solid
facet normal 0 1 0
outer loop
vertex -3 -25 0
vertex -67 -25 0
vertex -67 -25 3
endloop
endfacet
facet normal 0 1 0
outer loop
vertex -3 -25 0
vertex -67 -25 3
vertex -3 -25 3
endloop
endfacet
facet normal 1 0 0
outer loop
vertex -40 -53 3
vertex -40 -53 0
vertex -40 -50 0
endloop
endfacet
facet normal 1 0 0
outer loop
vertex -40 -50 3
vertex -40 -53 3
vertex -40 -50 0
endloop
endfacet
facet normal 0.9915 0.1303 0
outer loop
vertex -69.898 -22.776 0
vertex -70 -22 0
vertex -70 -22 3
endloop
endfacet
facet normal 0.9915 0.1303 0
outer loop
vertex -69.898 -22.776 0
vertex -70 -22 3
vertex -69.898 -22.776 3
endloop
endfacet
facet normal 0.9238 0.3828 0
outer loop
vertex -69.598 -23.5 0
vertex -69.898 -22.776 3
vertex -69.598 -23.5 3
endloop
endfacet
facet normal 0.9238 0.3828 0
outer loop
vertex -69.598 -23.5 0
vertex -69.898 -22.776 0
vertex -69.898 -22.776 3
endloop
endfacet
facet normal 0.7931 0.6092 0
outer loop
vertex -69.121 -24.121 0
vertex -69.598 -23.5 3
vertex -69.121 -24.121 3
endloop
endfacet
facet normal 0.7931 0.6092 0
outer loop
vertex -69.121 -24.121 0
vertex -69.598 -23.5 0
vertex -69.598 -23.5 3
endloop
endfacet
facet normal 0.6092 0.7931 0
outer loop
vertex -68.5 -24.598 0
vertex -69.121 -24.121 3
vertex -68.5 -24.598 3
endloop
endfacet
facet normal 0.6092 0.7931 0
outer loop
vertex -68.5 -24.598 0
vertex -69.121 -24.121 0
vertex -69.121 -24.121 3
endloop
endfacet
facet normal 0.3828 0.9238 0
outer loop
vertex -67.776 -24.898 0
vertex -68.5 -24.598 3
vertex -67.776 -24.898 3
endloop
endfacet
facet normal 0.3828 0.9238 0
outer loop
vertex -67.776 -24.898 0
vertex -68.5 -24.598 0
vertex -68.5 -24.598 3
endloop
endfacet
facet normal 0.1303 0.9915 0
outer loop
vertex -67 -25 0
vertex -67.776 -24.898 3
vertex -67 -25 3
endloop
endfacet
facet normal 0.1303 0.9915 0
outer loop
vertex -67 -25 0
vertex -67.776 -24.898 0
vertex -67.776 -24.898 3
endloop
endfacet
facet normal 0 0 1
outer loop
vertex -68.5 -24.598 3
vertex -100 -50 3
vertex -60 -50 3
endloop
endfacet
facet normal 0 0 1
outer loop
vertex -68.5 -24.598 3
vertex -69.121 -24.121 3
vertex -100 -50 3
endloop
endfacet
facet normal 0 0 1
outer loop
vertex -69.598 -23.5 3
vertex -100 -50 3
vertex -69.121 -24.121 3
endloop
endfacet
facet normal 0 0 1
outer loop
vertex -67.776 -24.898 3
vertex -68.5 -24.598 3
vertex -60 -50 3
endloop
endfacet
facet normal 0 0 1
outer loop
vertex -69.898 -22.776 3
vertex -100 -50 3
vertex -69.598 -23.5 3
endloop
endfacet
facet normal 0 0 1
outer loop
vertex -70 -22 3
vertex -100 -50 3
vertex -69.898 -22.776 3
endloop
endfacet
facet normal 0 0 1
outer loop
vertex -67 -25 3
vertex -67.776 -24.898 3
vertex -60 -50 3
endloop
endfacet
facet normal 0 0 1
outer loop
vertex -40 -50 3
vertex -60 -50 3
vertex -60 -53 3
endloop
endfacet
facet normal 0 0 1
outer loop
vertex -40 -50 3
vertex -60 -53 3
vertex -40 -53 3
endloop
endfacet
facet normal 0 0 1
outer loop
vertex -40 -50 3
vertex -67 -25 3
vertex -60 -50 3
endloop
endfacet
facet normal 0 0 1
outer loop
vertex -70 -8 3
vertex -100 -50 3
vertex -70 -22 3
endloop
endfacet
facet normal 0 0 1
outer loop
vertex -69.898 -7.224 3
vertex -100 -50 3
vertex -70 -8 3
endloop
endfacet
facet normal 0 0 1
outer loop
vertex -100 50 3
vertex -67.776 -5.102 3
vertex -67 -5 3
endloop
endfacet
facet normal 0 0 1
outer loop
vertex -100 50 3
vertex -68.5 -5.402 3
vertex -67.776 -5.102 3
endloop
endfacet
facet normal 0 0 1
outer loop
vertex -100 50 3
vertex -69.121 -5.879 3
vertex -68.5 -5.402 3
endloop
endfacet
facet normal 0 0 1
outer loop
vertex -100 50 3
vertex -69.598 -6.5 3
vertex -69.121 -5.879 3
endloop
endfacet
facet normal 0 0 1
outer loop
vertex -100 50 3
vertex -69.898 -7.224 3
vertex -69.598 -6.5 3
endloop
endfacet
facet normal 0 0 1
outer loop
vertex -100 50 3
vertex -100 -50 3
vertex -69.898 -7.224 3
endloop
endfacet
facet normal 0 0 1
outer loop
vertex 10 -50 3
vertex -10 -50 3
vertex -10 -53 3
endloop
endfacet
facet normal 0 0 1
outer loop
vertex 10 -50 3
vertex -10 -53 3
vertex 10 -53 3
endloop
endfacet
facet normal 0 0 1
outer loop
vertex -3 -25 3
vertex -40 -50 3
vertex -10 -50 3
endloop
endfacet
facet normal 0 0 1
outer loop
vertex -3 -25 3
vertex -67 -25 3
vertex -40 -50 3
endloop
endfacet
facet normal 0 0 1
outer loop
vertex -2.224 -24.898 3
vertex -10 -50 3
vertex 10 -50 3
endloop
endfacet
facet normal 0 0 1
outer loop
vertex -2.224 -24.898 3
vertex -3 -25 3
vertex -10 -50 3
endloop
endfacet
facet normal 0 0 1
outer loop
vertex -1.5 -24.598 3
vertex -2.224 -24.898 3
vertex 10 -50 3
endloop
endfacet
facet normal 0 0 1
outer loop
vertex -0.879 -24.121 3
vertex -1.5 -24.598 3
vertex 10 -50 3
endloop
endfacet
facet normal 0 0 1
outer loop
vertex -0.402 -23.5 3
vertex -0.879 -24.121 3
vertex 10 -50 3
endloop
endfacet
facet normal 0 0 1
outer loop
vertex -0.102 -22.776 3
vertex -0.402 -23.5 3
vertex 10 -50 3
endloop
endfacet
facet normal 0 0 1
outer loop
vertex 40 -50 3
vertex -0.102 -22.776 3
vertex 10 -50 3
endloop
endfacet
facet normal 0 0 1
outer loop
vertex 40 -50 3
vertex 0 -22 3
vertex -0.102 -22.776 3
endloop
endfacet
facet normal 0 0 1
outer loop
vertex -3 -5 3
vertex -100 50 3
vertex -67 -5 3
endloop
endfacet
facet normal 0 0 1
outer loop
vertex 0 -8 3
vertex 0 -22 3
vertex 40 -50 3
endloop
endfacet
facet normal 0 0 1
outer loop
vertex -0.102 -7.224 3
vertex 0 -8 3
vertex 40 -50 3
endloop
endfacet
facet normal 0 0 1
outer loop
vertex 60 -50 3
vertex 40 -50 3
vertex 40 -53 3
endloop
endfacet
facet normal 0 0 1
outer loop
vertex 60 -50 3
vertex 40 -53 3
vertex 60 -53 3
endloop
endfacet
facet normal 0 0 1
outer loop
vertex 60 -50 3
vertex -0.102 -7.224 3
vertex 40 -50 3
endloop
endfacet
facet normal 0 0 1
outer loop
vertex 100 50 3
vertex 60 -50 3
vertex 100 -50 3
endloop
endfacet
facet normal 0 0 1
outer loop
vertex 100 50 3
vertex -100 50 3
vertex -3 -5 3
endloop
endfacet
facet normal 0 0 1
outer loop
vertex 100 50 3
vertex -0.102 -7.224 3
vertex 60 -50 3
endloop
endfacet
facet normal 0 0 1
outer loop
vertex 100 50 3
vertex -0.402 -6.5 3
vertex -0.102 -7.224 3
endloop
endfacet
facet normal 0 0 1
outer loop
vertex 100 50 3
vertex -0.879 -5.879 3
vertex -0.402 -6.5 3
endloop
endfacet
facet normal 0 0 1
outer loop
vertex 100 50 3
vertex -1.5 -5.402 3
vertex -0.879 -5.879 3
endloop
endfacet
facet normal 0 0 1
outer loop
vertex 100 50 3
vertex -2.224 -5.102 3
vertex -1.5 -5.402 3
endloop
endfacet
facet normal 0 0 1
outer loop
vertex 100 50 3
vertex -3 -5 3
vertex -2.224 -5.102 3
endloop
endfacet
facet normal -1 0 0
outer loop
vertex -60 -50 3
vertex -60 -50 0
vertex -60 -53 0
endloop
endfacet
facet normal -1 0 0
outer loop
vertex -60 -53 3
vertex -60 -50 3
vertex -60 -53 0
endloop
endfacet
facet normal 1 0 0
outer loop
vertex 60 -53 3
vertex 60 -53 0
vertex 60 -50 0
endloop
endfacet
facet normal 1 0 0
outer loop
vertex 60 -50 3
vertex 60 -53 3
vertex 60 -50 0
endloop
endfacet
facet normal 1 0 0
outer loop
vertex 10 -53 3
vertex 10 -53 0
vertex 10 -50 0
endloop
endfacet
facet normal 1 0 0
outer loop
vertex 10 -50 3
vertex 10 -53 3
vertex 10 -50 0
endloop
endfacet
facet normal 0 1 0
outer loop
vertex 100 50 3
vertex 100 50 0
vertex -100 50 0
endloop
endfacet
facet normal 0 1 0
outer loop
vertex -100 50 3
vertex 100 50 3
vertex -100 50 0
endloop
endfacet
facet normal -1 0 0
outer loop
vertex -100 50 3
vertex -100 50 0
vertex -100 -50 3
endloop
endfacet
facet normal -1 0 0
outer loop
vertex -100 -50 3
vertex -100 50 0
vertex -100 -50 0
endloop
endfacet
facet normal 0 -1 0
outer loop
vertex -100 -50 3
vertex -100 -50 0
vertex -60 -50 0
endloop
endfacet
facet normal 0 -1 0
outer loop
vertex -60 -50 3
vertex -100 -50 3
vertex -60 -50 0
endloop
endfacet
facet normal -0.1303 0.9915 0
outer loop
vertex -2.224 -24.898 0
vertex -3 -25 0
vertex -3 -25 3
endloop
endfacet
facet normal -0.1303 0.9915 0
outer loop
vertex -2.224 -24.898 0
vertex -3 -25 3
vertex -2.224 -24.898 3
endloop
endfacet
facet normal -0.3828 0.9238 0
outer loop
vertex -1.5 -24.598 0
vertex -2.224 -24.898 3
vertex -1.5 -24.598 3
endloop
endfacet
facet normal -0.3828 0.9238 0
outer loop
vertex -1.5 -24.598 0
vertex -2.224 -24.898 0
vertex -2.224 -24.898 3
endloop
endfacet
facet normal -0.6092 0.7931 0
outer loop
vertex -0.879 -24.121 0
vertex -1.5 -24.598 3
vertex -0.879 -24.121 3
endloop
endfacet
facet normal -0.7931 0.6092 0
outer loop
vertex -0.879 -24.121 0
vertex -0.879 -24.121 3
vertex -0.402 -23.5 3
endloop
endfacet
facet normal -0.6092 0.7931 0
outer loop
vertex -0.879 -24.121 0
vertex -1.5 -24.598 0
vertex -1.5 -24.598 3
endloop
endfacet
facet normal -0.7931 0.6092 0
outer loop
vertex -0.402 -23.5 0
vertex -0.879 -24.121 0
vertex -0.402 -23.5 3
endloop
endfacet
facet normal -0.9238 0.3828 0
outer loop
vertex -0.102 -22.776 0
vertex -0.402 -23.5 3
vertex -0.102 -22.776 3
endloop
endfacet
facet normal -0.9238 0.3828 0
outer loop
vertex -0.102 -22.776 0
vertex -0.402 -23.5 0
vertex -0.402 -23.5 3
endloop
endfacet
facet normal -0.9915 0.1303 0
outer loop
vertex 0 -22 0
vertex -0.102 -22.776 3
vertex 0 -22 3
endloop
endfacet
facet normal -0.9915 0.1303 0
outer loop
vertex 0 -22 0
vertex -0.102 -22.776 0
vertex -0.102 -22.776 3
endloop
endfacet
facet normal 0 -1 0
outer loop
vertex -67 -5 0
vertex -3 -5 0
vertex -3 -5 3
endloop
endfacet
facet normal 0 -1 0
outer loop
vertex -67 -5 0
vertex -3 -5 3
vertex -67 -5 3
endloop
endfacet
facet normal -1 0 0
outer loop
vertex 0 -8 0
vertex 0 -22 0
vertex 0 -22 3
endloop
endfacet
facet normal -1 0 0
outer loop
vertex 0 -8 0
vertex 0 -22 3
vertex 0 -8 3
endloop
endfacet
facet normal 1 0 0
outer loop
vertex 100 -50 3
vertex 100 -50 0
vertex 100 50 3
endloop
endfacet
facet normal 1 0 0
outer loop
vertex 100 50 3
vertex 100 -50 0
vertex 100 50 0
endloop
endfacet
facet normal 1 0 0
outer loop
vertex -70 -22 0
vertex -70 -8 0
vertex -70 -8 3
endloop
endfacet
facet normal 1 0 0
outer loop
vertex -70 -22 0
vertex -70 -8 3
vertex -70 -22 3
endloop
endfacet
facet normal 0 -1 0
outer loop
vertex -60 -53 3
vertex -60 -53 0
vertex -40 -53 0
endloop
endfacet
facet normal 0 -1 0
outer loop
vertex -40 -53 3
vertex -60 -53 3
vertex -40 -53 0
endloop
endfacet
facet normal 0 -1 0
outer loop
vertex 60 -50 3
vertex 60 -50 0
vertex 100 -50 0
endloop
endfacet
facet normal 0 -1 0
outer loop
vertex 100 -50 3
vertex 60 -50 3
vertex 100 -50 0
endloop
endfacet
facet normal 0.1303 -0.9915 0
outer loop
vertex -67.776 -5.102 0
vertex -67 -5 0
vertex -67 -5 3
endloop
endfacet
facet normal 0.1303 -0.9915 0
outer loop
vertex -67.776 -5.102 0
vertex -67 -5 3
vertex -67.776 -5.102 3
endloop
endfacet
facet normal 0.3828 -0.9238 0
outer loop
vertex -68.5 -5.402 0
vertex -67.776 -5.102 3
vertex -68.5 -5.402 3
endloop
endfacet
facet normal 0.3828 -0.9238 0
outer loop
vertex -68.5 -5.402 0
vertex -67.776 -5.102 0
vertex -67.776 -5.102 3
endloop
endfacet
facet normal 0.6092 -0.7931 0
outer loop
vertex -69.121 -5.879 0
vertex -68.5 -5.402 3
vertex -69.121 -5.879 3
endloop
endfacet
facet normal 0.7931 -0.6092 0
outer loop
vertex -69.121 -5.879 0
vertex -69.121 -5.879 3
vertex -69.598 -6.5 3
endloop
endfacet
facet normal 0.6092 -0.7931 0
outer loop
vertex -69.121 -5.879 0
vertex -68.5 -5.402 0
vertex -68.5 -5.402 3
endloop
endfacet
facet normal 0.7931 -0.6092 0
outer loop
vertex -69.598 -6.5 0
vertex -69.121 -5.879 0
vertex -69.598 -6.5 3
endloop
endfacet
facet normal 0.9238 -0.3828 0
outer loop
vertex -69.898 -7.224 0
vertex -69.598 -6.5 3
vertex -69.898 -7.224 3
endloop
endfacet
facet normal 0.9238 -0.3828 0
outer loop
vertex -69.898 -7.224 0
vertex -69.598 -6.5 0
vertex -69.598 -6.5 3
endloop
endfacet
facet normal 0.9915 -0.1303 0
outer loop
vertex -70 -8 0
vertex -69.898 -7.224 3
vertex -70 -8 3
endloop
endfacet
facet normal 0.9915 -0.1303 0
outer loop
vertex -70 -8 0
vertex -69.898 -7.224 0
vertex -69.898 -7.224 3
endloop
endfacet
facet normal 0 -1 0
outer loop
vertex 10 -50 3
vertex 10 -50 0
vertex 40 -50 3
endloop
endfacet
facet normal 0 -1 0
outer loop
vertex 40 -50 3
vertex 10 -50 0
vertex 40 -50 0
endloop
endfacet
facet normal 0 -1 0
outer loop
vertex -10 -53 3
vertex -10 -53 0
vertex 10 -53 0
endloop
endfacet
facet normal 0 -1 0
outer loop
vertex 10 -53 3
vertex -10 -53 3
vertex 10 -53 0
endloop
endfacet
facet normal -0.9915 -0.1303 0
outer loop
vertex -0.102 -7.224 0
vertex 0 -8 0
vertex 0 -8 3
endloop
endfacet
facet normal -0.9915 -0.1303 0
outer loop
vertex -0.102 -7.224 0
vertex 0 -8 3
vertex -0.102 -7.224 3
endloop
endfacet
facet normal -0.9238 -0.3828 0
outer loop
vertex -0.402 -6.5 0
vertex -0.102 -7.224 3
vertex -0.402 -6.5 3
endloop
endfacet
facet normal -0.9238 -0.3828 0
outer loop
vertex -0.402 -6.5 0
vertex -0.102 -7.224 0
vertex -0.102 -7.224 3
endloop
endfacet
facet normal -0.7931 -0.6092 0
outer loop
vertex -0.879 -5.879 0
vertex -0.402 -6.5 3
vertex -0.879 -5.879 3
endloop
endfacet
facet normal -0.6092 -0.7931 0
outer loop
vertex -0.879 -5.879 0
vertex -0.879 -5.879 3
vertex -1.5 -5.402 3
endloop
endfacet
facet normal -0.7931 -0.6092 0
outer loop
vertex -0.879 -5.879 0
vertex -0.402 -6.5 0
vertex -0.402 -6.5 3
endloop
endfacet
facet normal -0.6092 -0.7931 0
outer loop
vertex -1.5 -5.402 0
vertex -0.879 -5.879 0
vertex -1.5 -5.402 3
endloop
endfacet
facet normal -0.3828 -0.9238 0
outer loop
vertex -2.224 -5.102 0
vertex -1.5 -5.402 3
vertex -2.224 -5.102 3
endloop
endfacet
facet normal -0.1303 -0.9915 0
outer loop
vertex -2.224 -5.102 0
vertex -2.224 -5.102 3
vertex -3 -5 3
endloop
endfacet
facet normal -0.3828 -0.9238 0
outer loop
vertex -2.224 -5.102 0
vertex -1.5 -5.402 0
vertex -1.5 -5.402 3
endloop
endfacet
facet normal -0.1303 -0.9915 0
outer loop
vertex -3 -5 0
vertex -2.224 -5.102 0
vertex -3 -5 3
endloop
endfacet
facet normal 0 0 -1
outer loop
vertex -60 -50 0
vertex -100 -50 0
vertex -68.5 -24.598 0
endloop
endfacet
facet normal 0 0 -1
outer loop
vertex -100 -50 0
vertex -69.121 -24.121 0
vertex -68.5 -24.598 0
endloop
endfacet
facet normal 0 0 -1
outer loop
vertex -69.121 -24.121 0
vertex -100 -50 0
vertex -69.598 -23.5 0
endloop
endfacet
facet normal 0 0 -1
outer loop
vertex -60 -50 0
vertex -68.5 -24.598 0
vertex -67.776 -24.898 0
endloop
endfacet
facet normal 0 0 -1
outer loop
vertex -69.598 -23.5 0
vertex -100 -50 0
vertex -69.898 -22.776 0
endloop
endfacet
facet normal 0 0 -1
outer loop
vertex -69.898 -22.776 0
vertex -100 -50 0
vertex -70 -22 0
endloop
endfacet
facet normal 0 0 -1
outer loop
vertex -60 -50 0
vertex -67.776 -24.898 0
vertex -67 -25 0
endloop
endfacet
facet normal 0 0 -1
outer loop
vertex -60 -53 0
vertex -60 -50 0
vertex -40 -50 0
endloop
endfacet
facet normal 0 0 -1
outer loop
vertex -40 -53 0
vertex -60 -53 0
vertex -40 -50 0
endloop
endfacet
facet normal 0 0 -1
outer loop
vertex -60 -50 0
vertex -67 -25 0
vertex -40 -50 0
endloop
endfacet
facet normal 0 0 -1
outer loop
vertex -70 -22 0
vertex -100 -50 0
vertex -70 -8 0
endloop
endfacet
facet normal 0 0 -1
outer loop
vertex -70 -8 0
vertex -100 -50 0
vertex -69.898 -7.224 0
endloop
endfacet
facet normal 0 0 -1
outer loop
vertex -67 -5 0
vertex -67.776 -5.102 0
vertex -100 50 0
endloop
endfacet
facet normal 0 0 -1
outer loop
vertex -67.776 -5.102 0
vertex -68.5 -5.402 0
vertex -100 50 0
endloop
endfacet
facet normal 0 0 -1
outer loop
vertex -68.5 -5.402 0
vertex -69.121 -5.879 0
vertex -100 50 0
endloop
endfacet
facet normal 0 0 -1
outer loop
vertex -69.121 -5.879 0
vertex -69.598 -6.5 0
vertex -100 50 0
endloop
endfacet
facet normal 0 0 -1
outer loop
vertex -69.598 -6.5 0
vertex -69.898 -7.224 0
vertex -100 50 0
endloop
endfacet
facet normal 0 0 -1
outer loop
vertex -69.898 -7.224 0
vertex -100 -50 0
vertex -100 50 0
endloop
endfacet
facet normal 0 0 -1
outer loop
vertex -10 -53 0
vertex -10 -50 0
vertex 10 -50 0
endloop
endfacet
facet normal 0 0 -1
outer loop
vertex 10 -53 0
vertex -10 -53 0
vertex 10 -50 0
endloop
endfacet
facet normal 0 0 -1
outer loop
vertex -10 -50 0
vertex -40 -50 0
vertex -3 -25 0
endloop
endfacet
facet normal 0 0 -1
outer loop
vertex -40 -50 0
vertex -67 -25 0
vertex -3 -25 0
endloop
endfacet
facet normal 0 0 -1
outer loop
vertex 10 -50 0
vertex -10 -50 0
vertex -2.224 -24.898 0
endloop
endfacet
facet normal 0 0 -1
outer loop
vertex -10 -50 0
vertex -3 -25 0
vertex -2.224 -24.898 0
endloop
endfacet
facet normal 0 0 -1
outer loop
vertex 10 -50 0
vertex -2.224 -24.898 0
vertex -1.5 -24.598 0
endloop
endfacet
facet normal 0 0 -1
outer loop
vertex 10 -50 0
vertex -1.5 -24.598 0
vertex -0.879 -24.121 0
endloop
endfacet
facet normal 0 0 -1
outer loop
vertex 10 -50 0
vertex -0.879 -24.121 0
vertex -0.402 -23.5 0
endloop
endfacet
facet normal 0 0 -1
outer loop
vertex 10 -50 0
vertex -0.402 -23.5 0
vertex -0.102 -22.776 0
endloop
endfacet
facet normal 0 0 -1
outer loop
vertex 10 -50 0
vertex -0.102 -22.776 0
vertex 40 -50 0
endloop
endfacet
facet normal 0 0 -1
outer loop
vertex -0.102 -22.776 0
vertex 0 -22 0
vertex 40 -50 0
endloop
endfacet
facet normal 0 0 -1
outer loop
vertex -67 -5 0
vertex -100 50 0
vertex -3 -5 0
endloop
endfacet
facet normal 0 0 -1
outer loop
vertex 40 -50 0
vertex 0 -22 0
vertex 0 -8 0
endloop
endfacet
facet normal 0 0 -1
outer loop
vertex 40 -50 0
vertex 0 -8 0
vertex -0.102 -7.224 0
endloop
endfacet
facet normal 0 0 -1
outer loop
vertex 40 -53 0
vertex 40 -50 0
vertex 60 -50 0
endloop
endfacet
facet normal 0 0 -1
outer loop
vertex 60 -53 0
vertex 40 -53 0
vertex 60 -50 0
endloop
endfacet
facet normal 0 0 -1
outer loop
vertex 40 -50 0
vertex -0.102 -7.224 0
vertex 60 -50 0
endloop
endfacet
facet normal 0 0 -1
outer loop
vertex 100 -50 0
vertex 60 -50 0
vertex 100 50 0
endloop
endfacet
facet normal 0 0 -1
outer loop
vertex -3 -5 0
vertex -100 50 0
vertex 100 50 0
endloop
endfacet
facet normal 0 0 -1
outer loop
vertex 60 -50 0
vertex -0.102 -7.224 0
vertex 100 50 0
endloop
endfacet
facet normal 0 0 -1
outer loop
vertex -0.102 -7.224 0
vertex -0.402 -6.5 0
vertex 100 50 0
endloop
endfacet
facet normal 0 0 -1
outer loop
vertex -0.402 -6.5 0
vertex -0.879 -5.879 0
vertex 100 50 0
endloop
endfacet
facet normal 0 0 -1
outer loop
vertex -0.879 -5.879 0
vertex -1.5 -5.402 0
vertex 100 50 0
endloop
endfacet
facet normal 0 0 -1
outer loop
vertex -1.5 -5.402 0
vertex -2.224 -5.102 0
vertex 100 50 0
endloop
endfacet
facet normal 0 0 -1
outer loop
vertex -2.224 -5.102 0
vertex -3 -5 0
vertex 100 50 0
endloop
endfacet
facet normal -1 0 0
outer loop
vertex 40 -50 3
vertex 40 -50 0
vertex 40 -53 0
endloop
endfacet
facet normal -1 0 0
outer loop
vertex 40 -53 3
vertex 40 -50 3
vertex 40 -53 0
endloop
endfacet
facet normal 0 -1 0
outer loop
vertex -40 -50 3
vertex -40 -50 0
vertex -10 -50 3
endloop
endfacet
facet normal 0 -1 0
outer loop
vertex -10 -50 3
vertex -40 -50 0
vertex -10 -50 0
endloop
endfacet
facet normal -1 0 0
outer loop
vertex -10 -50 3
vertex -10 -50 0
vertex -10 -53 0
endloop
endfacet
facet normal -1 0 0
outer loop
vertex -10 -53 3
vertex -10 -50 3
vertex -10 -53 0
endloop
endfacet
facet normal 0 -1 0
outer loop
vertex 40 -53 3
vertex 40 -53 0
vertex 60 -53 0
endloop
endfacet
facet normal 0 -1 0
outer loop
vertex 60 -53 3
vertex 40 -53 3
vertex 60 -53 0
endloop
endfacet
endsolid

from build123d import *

# Parameters (mm, degrees)
BOSS_EXTRUDE1_DEPTH = 3


with BuildPart() as part:
    # Sketch1 → Boss-Extrude1 (new body)
    with BuildSketch(Plane.XY):
        Polygon((-100, -50), (-60, -50), (-60, -53), (-40, -53), (-40, -50), (-10, -50), (-10, -53), (10, -53), (10, -50), (40, -50), (40, -53), (60, -53), (60, -50), (100, -50), (100, 50), (-100, 50), align=None)
        with BuildLine():
            Line((-67, -25), (-3, -25))
            ThreePointArc((-3, -25), (-0.878679656, -24.121320344), (0, -22))
            Line((0, -22), (0, -8))
            ThreePointArc((0, -8), (-0.878679656, -5.878679656), (-3, -5))
            Line((-3, -5), (-67, -5))
            ThreePointArc((-67, -5), (-69.121320344, -5.878679656), (-70, -8))
            Line((-70, -8), (-70, -22))
            ThreePointArc((-70, -22), (-69.121320344, -24.121320344), (-67, -25))
        make_face(mode=Mode.SUBTRACT)
    extrude(amount=BOSS_EXTRUDE1_DEPTH)


solid = part.part
